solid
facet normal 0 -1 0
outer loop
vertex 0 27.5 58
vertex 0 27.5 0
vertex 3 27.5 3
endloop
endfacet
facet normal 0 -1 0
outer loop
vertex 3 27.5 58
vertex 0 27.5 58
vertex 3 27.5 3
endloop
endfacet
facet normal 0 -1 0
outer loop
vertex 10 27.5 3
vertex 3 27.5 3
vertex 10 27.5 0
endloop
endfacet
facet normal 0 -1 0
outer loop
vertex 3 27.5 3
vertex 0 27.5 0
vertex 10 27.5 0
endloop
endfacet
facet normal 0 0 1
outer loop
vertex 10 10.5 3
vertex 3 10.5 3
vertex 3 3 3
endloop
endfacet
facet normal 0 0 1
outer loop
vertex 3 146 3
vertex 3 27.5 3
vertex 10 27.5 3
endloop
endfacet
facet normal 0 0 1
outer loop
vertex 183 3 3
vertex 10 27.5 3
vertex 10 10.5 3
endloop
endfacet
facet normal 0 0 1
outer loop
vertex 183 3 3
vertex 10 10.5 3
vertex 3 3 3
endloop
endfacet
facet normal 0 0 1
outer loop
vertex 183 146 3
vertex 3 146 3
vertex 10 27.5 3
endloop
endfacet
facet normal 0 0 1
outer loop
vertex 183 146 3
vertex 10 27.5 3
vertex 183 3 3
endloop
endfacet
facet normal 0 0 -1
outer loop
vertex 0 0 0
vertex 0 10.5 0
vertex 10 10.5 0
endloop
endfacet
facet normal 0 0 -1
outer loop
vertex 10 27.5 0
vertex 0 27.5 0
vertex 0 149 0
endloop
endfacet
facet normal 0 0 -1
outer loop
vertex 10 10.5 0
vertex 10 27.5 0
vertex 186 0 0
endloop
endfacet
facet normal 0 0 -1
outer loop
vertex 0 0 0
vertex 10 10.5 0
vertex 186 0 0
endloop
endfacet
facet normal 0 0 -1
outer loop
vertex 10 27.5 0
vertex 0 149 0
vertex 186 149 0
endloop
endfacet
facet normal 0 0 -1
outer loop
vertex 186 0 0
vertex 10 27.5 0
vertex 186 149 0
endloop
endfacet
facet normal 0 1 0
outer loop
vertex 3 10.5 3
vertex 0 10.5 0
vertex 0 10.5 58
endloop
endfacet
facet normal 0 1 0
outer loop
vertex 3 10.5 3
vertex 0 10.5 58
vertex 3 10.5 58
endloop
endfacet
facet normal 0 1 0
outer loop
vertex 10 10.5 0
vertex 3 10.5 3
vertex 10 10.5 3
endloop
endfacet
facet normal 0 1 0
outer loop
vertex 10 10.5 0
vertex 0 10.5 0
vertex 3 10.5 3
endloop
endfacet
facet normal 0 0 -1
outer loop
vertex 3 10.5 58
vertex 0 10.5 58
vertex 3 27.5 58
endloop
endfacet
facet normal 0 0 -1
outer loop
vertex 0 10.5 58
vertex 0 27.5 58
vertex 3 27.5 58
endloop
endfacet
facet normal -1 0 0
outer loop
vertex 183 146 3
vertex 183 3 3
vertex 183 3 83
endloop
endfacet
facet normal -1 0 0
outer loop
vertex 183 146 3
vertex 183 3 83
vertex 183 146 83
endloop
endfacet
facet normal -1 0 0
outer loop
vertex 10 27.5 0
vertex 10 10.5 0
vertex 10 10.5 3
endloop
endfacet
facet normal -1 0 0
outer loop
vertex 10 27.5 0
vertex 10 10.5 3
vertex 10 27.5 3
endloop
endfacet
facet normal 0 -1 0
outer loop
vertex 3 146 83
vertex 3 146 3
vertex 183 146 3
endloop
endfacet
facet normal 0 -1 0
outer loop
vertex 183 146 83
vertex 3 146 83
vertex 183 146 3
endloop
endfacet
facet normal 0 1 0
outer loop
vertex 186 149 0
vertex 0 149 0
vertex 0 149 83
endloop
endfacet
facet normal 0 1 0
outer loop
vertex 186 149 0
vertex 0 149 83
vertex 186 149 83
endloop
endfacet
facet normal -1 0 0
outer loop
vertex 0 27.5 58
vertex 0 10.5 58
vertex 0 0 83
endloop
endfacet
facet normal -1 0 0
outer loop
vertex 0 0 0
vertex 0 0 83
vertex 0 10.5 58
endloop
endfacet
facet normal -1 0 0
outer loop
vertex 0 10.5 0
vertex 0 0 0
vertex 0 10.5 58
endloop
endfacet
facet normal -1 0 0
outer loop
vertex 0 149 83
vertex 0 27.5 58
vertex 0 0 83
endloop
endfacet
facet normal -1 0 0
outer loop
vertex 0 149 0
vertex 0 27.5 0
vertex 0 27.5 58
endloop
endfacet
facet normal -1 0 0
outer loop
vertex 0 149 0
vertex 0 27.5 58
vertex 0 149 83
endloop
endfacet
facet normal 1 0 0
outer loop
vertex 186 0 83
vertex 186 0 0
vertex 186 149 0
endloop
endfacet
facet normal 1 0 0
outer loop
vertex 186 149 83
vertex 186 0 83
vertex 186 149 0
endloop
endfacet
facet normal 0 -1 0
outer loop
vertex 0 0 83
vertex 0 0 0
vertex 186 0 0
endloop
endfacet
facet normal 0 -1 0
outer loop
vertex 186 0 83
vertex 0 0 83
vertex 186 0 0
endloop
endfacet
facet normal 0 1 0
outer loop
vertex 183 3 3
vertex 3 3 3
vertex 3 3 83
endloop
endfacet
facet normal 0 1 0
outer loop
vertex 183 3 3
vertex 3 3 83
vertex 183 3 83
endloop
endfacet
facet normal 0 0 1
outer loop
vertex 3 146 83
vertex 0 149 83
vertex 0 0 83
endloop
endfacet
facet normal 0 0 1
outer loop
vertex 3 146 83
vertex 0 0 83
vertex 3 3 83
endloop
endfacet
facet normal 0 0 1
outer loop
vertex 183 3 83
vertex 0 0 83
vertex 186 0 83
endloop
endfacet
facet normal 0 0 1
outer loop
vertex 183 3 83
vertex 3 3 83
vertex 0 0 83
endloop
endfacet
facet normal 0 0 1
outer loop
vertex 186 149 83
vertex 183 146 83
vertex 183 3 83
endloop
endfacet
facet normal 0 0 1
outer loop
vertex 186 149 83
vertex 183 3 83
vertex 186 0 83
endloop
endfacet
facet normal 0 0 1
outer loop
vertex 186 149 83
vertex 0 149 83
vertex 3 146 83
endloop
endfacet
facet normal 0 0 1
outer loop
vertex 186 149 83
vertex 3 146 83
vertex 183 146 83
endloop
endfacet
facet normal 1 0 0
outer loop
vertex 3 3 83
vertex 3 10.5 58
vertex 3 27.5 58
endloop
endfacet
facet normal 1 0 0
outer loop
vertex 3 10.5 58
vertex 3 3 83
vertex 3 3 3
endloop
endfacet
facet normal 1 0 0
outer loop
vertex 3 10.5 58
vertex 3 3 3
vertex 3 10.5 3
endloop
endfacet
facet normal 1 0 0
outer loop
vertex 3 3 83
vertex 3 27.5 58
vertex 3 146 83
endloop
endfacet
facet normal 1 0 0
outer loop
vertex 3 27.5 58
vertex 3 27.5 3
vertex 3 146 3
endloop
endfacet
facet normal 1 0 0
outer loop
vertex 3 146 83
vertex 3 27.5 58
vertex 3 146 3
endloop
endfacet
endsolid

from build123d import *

# Parameters (mm, degrees)
SKETCH_1_W                      = 186
SKETCH_1_H                      = 149
FLOOR_T3_DEPTH                  = 3
SKETCH_2_W                      = 186
SKETCH_2_H                      = 149
SKETCH_2_W_2                    = 180
SKETCH_2_H_2                    = 143
WALLS_T3_DEPTH80_DEPTH          = 83
SKETCH_3_W                      = 11
SKETCH_3_H                      = 8
SERVO_STAND_RELIEF_W8_H58_DEPTH = 58
SKETCH_4_W                      = 11
SKETCH_4_H                      = 17
SERVO_EARS_RELIEF_V3_DEPTH      = 58


with BuildPart() as part:
    # 草图1 → Floor_T3 (new body)
    with BuildSketch(Plane.XY):
        with Locations((93, 74.5)):
            Rectangle(SKETCH_1_W, SKETCH_1_H)
    extrude(amount=FLOOR_T3_DEPTH)

    # 草图2 → Walls_T3_depth80 (add)
    with BuildSketch(Plane.XY):
        with Locations((93, 74.5)):
            Rectangle(SKETCH_2_W, SKETCH_2_H)
        with Locations((93, 74.5)):
            Rectangle(SKETCH_2_W_2, SKETCH_2_H_2, mode=Mode.SUBTRACT)
    extrude(amount=WALLS_T3_DEPTH80_DEPTH)

    # 草图3 → Servo_stand_relief_W8_H58 (cut)
    with BuildSketch(Plane.XY):
        with Locations((4.5, 23.5)):
            Rectangle(SKETCH_3_W, SKETCH_3_H)
    extrude(amount=SERVO_STAND_RELIEF_W8_H58_DEPTH, mode=Mode.SUBTRACT)

    # 草图4 → Servo_ears_relief_v3 (cut)
    with BuildSketch(Plane.XY):
        with Locations((4.5, 19)):
            Rectangle(SKETCH_4_W, SKETCH_4_H)
    extrude(amount=SERVO_EARS_RELIEF_V3_DEPTH, mode=Mode.SUBTRACT)


solid = part.part
